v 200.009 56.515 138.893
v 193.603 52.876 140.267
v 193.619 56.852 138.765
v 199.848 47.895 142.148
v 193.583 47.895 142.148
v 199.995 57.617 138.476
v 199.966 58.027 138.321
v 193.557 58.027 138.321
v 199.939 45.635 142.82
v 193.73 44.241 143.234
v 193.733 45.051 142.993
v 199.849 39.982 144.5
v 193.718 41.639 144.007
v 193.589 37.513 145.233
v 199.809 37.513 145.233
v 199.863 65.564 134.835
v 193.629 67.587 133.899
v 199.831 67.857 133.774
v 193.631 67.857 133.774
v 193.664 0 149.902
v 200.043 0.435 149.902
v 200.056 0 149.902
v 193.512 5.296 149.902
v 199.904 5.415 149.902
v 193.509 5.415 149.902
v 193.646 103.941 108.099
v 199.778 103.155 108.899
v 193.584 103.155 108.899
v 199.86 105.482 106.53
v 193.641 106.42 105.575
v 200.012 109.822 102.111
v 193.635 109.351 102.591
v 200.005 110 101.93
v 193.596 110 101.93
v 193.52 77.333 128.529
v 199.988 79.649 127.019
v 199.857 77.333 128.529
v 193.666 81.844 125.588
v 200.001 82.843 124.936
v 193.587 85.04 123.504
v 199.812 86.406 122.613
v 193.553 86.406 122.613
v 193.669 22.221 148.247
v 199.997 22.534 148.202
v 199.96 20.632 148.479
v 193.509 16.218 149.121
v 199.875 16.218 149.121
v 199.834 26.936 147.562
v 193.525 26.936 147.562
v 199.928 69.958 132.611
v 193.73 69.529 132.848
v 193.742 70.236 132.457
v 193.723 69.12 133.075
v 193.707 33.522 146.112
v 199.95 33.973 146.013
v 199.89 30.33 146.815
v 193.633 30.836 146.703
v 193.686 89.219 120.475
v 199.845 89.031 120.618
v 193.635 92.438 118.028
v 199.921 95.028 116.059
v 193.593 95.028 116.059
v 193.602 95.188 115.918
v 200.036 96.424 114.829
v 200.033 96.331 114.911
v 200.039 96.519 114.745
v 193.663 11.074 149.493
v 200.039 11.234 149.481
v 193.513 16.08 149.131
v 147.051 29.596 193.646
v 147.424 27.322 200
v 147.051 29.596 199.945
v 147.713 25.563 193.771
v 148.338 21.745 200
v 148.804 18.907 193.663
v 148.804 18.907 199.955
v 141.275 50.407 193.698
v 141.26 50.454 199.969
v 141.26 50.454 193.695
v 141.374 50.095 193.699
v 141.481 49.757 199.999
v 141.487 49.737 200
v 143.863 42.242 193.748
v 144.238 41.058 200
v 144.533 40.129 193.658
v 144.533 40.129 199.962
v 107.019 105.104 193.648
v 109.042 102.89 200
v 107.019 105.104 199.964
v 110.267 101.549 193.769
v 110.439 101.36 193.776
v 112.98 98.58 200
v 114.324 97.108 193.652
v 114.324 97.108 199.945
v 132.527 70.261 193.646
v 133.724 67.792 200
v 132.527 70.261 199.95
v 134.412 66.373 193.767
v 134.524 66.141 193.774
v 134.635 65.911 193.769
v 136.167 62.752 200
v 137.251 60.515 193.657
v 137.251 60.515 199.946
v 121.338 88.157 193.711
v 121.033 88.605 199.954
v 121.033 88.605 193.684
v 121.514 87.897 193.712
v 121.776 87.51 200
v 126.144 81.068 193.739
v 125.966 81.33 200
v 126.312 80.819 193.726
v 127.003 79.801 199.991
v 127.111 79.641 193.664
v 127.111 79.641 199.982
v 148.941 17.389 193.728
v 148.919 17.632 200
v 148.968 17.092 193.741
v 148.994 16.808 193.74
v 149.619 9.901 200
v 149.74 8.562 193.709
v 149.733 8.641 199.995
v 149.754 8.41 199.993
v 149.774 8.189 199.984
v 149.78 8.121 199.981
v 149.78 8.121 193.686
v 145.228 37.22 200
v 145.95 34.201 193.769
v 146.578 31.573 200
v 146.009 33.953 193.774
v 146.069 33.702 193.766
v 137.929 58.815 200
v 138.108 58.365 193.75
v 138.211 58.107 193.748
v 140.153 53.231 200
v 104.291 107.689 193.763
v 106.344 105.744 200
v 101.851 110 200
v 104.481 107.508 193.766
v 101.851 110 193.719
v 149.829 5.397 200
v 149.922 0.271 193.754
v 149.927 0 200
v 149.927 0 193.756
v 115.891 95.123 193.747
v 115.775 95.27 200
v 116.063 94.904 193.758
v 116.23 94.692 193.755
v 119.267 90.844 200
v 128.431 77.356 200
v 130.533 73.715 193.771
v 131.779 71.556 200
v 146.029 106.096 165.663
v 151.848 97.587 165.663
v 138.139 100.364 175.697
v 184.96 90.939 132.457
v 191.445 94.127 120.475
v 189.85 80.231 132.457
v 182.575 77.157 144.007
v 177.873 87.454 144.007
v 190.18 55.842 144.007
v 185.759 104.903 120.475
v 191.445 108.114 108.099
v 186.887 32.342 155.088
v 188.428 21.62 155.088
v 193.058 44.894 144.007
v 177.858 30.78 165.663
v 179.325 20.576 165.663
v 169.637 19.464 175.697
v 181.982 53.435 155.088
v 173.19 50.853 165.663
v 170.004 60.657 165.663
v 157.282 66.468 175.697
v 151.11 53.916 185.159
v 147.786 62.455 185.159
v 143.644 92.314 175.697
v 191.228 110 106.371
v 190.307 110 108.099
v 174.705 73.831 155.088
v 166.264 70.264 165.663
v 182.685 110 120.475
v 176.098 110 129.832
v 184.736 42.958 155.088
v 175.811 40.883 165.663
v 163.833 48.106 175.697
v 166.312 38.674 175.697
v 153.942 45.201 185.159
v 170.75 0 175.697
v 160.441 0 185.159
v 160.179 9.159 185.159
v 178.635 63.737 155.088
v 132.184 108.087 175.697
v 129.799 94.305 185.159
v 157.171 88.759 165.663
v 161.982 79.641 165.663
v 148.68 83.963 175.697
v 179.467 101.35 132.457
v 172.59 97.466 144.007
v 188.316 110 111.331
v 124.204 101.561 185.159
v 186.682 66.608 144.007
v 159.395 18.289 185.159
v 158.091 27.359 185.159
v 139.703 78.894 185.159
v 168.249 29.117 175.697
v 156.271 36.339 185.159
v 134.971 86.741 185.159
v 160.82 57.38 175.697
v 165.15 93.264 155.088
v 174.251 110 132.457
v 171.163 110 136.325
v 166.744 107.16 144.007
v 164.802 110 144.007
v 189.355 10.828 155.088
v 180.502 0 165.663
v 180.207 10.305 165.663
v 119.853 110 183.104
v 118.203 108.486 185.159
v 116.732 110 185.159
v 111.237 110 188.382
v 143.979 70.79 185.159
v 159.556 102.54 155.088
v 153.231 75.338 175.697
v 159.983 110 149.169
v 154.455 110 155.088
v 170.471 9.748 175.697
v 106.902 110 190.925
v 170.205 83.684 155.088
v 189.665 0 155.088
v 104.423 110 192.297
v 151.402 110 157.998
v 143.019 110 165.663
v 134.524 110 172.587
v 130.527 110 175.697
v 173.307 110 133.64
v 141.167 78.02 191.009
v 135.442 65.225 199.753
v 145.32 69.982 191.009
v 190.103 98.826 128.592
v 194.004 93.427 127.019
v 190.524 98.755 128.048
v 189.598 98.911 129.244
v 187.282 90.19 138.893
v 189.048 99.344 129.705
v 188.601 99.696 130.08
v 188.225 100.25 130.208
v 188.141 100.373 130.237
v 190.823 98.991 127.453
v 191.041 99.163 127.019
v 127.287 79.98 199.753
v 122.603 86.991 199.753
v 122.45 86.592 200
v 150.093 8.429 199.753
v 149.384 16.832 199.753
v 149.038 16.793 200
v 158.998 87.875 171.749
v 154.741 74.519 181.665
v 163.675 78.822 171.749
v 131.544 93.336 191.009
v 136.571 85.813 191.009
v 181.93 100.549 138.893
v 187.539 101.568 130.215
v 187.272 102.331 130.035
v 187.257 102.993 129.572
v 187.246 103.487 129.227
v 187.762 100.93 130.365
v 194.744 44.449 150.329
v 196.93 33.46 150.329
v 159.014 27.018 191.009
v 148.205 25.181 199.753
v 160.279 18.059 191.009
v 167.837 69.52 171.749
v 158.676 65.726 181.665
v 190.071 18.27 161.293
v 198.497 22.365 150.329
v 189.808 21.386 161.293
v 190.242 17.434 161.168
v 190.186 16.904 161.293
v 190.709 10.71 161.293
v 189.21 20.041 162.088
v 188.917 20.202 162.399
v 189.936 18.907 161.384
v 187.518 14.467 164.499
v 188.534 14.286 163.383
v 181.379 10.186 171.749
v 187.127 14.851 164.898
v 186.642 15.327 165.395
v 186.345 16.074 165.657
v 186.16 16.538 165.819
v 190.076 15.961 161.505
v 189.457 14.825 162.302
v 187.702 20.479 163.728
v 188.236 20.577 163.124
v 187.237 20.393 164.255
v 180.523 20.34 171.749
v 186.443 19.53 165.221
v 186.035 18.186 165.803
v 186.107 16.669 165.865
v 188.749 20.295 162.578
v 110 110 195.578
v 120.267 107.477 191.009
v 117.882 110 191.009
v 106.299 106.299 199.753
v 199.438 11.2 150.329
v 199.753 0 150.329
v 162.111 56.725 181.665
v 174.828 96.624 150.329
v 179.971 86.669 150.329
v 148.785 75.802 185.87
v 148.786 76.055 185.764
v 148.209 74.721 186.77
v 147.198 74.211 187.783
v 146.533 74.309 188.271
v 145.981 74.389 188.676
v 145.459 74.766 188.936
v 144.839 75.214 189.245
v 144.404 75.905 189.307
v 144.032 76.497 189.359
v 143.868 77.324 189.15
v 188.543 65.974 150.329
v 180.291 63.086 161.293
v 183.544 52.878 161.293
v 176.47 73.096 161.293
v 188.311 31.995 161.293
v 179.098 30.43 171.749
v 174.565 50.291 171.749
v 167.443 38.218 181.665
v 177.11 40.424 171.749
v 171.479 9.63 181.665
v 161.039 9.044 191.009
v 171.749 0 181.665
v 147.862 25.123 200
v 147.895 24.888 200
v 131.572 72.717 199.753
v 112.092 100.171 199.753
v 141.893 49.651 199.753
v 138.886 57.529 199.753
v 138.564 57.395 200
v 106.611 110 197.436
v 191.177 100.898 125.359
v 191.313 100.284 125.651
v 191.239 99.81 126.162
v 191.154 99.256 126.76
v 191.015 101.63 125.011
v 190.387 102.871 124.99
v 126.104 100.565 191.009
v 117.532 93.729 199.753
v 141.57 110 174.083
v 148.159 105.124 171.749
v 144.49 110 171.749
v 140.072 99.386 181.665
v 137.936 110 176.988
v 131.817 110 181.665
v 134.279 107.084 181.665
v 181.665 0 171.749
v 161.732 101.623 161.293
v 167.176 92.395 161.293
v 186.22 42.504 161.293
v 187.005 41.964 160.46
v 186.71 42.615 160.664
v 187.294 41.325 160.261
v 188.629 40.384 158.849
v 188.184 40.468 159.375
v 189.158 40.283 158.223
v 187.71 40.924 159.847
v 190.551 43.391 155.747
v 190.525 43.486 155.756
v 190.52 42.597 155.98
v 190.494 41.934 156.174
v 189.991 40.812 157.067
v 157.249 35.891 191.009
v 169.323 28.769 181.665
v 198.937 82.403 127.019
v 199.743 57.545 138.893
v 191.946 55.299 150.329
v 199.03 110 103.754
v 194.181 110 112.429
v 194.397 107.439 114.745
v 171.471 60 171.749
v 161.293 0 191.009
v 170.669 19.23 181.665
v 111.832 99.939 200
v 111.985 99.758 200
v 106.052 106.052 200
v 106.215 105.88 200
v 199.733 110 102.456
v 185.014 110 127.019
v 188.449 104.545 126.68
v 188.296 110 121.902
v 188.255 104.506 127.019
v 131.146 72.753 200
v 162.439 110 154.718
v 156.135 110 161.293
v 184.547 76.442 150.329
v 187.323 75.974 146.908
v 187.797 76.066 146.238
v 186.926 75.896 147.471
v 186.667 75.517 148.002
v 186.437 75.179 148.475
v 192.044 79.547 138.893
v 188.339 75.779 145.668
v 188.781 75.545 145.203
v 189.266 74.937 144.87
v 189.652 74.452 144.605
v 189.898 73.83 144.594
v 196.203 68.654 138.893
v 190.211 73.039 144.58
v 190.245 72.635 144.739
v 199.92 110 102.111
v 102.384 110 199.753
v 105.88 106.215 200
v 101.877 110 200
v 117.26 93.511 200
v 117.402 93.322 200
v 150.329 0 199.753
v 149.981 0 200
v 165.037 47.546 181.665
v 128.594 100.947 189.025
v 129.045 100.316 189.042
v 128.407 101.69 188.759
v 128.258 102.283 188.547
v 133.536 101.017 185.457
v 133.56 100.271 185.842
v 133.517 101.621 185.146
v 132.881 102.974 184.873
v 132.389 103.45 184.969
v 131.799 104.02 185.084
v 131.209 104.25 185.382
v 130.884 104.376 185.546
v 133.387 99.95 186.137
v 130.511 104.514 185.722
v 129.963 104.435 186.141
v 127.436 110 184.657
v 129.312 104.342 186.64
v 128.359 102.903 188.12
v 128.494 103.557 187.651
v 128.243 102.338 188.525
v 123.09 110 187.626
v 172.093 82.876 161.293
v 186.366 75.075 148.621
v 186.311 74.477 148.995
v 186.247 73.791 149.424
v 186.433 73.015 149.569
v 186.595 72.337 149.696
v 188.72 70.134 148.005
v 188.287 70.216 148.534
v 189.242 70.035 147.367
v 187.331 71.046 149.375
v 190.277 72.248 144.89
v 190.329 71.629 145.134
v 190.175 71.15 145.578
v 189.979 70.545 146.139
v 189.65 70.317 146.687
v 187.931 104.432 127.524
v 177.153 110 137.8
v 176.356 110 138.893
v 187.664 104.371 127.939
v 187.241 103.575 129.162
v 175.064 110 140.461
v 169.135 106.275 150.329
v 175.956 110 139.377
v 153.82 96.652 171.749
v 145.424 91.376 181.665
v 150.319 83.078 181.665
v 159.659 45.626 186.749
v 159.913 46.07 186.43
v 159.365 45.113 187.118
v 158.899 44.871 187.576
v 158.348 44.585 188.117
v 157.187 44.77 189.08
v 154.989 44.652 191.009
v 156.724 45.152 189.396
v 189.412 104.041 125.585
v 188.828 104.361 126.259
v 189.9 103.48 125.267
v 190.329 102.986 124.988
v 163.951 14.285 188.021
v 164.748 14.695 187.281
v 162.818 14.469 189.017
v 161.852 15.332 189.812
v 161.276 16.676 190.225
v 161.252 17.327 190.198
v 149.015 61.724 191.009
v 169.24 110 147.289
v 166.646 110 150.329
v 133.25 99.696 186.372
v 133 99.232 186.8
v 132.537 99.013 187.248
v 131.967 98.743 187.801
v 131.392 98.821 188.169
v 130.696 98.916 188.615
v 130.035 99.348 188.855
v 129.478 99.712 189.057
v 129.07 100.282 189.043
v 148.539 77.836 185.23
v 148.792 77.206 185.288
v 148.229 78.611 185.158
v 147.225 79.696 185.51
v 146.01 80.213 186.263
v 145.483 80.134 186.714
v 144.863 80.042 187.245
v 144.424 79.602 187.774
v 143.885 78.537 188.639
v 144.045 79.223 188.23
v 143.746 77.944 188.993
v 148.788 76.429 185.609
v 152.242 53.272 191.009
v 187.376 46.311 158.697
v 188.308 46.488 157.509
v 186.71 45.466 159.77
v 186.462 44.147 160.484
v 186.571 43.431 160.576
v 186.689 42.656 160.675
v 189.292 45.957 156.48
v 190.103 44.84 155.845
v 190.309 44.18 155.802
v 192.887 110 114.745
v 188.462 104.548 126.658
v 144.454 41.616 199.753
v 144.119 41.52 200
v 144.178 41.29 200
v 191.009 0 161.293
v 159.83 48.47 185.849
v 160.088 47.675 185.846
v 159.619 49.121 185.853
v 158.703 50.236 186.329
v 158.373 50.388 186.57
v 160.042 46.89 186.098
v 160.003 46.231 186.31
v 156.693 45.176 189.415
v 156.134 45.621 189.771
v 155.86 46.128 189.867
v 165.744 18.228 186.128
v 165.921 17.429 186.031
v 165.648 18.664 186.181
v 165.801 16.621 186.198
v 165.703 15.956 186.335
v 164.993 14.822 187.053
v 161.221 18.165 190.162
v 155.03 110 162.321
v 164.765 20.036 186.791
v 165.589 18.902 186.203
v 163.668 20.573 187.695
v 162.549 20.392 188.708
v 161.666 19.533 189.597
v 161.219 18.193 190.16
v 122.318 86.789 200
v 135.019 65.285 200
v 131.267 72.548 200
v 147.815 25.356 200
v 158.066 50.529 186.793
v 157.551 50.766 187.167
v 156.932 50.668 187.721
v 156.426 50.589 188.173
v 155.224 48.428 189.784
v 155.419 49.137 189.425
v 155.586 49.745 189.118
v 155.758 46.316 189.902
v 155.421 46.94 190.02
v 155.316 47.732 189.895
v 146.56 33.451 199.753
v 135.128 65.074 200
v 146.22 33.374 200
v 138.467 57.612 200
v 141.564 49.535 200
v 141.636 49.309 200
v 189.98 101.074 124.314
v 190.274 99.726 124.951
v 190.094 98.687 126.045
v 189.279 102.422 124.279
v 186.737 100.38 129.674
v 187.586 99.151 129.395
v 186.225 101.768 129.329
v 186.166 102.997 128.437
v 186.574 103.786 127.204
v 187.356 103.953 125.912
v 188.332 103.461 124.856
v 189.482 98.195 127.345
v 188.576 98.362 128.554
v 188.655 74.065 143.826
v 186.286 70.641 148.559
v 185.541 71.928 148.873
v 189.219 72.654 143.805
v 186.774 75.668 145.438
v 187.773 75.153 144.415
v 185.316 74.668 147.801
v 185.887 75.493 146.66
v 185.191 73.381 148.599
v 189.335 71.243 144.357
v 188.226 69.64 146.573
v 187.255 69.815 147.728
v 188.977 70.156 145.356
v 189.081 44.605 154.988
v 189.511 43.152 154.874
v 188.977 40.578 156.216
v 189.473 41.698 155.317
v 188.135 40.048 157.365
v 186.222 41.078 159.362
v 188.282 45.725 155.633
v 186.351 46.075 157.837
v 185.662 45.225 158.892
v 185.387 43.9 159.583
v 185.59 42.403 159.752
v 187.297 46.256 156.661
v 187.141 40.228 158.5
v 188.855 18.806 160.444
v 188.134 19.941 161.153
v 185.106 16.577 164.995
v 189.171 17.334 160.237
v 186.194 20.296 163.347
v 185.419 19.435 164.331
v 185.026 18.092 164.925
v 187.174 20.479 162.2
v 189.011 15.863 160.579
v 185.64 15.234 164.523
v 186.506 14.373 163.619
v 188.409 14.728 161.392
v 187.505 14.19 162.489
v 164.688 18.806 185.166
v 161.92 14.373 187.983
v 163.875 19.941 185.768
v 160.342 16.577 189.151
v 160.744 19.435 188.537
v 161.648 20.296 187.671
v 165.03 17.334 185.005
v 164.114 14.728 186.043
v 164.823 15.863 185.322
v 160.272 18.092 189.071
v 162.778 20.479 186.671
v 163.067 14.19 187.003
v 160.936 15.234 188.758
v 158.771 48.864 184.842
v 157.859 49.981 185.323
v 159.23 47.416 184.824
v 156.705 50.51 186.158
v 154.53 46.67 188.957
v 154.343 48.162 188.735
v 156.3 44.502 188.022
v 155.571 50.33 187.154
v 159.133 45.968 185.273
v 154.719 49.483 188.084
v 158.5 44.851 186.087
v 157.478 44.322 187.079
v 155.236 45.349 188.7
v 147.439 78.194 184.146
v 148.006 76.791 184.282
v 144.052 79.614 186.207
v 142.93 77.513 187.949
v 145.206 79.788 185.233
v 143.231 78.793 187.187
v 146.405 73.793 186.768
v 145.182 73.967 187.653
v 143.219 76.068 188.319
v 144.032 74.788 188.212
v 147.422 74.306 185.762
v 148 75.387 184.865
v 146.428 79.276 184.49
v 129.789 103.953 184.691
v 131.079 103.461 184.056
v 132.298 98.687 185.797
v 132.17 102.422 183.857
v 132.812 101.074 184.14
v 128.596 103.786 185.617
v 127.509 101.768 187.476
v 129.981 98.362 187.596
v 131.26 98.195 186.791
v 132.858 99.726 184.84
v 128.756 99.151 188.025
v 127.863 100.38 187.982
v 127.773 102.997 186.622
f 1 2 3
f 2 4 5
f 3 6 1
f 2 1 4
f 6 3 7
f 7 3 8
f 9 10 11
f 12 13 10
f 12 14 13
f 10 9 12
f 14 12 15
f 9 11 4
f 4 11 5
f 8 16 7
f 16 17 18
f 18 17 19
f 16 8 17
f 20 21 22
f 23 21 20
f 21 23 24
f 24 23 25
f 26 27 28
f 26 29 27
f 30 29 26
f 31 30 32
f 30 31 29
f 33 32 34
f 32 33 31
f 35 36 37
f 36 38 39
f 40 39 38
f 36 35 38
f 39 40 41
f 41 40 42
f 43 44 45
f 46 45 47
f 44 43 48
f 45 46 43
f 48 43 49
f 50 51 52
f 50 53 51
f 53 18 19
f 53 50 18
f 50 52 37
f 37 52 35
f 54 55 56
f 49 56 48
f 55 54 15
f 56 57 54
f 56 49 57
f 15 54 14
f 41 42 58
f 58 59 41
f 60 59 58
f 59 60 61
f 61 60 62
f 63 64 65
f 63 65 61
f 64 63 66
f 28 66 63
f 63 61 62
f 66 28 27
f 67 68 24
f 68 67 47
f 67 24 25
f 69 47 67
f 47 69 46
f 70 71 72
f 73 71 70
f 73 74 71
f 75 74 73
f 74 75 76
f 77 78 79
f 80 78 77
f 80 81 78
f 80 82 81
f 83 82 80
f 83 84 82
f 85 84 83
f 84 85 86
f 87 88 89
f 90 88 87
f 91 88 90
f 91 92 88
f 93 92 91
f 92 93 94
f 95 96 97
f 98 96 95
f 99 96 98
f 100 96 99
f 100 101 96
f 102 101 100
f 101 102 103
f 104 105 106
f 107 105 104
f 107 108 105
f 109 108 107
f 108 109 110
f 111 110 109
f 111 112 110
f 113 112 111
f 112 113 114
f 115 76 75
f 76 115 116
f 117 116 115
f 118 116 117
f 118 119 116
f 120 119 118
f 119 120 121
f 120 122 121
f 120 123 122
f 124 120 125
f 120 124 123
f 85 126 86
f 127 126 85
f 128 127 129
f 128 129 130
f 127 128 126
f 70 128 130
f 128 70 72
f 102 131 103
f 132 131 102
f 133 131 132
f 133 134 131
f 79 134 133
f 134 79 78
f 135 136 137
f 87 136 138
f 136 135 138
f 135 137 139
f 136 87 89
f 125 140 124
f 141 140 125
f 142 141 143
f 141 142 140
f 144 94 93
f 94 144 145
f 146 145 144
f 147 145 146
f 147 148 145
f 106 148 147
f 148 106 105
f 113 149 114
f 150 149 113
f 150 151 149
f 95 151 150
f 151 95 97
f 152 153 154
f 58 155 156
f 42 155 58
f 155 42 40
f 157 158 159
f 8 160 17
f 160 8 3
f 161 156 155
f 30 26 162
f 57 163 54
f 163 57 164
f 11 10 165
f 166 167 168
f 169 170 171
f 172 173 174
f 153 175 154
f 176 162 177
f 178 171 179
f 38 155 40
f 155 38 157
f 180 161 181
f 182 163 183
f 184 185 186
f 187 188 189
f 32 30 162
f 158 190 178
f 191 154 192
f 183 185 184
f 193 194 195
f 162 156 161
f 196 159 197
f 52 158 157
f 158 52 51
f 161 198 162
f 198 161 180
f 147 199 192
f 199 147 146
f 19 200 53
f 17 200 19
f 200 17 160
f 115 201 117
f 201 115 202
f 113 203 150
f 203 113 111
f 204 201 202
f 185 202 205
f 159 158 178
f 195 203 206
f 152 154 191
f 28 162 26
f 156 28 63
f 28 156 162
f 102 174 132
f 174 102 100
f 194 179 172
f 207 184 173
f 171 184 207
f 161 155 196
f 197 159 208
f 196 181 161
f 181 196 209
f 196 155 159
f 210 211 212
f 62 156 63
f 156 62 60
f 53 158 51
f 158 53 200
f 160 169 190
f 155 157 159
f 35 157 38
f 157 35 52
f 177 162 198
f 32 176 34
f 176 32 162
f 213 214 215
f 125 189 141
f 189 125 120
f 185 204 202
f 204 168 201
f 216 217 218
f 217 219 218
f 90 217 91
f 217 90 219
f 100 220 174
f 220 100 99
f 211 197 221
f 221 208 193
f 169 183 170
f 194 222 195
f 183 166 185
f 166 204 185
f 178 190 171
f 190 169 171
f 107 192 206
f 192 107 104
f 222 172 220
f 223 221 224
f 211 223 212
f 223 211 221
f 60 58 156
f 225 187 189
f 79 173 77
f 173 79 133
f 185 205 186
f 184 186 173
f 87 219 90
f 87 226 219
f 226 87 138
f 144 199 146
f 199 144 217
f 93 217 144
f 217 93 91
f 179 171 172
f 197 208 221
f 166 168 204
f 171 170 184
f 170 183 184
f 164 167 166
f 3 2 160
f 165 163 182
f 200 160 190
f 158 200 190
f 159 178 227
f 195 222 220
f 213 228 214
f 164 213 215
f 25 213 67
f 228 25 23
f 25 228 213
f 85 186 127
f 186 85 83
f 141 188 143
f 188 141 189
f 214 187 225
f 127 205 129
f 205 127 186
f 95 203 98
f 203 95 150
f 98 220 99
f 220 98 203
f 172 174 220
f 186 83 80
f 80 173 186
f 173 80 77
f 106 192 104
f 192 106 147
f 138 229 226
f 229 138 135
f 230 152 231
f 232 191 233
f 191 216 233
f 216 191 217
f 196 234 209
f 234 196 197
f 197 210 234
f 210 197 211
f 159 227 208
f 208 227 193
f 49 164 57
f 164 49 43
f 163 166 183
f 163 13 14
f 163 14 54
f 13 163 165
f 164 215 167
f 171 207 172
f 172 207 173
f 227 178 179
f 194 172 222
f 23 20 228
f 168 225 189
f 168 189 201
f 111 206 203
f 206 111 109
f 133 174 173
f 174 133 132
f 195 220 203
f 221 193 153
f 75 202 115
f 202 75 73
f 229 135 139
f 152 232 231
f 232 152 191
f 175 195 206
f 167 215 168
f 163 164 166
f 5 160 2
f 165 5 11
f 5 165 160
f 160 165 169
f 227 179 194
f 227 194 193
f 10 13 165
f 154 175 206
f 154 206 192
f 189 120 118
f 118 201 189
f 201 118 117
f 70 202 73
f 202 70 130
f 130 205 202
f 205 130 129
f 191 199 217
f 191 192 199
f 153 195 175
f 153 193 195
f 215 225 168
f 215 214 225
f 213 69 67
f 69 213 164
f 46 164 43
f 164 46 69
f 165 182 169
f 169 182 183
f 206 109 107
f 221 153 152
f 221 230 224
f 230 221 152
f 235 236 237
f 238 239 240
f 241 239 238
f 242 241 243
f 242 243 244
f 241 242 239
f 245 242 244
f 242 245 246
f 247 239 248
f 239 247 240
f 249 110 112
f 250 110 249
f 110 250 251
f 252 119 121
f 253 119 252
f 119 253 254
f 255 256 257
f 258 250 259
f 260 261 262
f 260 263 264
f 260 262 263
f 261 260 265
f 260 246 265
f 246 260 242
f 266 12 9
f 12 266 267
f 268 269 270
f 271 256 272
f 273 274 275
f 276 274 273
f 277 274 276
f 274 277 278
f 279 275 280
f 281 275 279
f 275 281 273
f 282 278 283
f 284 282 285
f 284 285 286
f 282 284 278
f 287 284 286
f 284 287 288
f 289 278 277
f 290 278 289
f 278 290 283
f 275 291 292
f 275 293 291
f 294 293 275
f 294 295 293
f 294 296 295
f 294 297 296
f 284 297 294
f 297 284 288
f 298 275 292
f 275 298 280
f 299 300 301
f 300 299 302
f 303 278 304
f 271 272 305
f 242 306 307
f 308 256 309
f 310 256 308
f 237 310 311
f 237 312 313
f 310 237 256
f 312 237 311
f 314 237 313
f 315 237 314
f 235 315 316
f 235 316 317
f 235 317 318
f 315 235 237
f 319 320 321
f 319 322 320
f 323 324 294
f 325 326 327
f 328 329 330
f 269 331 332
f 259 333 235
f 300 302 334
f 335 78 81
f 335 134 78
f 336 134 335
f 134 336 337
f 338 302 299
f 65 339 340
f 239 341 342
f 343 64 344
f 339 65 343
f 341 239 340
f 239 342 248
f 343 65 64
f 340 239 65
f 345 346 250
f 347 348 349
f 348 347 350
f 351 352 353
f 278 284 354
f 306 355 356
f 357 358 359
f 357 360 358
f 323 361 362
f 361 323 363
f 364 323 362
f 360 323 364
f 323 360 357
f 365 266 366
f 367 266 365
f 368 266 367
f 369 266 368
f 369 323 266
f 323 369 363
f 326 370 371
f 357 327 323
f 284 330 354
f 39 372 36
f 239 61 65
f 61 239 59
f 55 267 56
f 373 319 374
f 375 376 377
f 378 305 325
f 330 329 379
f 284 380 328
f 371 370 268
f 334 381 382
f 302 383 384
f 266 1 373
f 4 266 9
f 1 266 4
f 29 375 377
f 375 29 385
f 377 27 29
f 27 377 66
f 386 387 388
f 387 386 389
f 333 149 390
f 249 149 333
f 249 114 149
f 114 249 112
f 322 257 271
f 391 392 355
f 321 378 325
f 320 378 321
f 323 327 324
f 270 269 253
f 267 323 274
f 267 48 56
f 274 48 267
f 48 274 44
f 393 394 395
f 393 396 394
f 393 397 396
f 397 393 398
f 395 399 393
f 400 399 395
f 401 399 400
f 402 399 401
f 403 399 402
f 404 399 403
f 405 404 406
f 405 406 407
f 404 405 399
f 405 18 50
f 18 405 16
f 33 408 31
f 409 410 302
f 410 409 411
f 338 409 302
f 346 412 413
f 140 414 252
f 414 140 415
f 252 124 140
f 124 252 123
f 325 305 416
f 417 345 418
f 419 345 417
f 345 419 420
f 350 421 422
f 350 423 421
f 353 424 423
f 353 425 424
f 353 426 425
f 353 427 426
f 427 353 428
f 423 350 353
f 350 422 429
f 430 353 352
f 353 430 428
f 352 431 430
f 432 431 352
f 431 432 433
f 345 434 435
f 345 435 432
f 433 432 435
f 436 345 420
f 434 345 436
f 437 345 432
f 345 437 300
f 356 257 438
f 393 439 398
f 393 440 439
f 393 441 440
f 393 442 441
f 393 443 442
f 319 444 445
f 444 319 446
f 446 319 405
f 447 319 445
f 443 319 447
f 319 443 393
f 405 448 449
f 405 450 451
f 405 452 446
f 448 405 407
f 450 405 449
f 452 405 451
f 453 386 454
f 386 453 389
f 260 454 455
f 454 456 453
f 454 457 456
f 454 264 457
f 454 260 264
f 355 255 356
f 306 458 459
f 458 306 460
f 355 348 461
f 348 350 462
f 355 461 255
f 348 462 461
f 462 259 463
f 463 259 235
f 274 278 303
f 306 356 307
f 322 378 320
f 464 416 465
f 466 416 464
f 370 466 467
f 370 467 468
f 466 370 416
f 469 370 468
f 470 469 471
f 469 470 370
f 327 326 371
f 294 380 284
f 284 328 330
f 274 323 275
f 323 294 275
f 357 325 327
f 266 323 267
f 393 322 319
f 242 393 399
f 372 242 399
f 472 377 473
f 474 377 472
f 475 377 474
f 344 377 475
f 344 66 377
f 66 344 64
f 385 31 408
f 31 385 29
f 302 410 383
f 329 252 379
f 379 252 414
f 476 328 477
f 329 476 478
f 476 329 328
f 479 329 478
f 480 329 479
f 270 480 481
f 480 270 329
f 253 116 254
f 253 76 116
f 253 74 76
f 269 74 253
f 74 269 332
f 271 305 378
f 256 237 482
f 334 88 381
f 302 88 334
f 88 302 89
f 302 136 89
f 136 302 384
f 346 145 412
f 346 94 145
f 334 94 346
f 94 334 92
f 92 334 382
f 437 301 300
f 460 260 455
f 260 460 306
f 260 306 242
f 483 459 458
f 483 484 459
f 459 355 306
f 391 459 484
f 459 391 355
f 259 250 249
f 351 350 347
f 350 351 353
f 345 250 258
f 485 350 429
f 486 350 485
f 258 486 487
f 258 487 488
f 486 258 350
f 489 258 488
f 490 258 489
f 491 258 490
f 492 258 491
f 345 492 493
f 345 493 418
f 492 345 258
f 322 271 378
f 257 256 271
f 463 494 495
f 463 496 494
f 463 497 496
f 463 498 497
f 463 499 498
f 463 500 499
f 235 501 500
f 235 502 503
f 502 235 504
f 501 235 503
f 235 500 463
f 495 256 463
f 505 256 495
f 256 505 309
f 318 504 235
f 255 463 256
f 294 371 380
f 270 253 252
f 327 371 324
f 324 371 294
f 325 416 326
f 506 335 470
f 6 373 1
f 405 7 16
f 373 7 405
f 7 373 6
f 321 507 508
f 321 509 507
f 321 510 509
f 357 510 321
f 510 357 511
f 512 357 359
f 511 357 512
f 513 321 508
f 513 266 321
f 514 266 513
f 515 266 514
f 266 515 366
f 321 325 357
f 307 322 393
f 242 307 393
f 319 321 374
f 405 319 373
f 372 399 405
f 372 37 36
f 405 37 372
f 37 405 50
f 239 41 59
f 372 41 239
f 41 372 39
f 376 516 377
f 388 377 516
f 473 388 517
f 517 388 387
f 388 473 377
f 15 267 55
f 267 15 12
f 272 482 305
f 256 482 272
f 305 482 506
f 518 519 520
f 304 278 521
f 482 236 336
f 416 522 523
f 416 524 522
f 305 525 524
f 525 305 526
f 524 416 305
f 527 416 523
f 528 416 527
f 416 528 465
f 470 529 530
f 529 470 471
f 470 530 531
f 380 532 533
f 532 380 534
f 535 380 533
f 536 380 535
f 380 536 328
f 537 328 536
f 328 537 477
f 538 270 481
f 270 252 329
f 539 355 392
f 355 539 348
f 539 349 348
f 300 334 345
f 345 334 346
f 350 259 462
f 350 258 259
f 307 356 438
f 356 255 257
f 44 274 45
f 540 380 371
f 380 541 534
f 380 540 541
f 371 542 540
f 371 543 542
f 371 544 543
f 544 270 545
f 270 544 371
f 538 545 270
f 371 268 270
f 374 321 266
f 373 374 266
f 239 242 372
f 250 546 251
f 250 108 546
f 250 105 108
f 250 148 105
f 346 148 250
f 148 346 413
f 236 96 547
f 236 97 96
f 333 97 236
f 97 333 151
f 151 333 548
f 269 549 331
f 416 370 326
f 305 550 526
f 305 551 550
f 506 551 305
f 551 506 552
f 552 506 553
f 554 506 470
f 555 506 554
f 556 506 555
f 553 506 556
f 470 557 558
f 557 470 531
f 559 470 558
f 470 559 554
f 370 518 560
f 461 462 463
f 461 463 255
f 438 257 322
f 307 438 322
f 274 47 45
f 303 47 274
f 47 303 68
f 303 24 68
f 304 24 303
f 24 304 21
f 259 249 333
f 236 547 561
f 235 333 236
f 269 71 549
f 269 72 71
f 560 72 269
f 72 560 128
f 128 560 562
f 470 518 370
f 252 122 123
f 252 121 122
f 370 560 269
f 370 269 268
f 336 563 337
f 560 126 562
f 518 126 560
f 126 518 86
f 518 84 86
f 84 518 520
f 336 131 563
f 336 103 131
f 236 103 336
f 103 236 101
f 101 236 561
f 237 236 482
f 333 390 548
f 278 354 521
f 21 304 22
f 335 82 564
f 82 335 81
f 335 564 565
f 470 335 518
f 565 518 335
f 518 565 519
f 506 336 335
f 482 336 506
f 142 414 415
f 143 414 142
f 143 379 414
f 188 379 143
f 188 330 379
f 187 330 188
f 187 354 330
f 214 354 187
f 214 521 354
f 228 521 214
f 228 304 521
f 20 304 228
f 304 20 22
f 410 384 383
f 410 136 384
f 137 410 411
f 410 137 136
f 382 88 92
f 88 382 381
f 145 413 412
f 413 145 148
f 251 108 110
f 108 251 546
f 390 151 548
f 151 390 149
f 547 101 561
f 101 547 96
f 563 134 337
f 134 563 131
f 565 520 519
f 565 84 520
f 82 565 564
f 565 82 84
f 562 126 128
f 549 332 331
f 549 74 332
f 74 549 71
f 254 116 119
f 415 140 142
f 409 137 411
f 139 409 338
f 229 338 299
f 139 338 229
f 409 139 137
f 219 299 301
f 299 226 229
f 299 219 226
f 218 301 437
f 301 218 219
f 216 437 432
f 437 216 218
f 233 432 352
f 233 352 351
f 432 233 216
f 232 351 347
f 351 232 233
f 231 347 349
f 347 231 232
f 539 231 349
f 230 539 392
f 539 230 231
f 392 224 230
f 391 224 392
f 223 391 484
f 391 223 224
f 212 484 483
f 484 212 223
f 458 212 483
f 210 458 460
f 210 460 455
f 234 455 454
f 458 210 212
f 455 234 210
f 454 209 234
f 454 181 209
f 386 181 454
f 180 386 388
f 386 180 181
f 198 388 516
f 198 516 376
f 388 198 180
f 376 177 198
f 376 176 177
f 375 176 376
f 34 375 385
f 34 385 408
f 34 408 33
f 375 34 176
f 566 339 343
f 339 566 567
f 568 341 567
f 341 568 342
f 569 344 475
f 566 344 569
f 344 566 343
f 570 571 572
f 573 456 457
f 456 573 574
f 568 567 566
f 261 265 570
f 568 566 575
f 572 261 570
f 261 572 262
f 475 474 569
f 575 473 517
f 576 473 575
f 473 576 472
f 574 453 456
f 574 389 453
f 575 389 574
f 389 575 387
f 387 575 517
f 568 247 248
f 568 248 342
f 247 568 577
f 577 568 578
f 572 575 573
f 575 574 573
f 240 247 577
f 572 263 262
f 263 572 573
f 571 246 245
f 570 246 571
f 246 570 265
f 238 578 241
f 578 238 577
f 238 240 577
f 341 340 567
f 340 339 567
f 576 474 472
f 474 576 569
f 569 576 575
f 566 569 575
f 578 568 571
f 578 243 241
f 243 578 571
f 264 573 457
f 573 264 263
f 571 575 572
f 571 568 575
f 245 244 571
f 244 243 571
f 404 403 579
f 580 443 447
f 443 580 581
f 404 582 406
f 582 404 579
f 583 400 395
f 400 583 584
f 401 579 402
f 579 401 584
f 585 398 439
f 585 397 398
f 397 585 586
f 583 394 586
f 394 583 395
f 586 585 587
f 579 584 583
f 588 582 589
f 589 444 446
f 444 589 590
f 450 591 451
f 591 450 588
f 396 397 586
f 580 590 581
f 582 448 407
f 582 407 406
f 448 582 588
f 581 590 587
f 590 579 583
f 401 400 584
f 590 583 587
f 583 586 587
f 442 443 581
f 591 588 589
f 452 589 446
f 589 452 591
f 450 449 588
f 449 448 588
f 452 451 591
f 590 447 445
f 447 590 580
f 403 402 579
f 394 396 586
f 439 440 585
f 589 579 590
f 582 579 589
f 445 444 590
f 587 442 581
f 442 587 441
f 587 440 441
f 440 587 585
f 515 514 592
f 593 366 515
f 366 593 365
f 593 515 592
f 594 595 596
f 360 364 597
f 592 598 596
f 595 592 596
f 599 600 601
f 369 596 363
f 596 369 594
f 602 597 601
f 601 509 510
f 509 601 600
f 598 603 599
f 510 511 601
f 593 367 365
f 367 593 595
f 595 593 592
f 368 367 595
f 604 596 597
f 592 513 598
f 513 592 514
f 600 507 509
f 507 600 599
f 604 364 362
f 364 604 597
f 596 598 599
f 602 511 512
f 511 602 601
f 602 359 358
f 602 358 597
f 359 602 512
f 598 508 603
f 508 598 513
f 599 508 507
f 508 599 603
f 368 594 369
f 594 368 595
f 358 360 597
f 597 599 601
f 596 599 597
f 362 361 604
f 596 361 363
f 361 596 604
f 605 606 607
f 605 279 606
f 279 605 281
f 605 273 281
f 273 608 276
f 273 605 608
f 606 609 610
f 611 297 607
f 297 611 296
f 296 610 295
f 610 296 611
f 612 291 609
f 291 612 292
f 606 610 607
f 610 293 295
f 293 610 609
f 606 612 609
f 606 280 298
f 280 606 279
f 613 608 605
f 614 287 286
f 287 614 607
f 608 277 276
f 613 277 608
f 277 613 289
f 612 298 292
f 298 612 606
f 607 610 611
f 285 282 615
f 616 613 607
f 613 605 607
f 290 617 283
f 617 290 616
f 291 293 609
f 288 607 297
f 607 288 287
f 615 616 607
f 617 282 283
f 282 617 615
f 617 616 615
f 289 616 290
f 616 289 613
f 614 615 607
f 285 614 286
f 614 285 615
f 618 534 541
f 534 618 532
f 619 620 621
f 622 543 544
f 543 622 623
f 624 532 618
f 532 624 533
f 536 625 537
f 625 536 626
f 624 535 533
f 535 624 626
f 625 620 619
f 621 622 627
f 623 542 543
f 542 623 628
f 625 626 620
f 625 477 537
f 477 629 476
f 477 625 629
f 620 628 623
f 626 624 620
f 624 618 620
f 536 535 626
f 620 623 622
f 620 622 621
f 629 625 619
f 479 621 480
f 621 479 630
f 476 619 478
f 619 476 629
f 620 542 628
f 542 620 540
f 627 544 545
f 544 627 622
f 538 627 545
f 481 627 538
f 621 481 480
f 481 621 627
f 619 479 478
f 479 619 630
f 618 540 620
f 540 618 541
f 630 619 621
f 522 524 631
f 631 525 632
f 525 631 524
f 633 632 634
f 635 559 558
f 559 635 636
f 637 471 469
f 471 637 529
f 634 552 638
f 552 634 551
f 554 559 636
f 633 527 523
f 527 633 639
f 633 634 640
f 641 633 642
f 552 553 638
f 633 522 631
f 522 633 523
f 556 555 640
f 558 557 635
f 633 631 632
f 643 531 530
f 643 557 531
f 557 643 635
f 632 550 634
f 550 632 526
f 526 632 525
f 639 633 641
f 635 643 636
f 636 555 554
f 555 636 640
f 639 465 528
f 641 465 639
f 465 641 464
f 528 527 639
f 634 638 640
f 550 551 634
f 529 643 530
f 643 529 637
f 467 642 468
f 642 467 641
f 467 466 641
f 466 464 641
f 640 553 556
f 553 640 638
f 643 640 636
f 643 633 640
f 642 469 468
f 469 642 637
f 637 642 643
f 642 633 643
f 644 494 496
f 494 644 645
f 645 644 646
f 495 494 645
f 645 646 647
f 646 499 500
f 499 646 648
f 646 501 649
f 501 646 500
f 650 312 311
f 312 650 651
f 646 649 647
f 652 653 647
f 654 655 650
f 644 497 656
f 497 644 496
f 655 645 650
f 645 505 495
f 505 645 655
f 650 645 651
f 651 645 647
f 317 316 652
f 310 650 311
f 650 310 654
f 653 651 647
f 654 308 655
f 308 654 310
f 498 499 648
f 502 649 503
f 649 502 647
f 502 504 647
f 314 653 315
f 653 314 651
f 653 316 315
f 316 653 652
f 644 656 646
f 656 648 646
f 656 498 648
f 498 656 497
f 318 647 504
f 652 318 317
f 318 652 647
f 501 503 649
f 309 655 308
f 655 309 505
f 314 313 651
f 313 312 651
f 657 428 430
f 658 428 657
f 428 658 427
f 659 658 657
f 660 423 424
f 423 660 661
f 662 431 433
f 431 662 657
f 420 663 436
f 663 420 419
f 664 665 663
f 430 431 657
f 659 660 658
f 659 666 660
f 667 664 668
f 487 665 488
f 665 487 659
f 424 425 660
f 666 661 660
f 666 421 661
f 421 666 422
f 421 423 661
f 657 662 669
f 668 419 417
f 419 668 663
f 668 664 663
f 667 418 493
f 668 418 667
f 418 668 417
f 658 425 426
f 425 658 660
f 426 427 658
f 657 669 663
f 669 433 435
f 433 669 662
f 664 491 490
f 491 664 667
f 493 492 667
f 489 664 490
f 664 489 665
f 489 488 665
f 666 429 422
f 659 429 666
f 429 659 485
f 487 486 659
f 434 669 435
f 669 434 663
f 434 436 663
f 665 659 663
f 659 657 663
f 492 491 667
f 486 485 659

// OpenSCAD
// file: ../motors/MN5212.scad
use <../utils.scad>

module MN5212(){

	render(){
		translate([0,0, 42.5 / 2 - 23 / 2 - 4.9 - 6])
			cylinder(
				h = 23,
				r = 59 / 2,
				$fa = fa(59 / 2),
				center = true);
		translate([0,0, 42.5 / 2 - 4.9 / 2 - 6])
			cylinder(
				h = 4.9,
				r1 = 59 / 2,
				r2 = 24.8 / 2,
				$fa = fa(59 / 2),
				center = true);
		translate([0,0, - 42.5 / 2 + 5.6 / 2 + 3])
			cylinder(
				h = 5.6,
				r1 = 44 / 2,
				r2 = 59 / 2,
				$fa = fa(59 / 2),
				center = true);
		translate([0, 0, 42.5 / 2 - 3])
			cylinder(
				h = 6,
				r = 4 / 2,
				$fa = fa(4 / 2),
				center = true);
		translate([0, 0, - 42.5 / 2 + 1.5])
			cylinder(
				h = 3,
				r = 6 / 2,
				$fa = fa(6 / 2),
				center = true);
	}

}
// file: ../servos/HS_5065MG.scad
use <../utils.scad>

module HS_5065MG(){

	length = 23.75;
	width = 11.68;
	depth = 20.32;
	wing_width = 32.38;
	wing_thick = 3.43;
	shaft_offset = 6;
	hole_spacing = 28.32;
	shaft_height = 26.16;
	shaft_length = 2;

	module mounting_hole(){
		mh_rad = 2 / 2;
		translate(
			[
				hole_spacing / 2,
				0,
				depth / 2 - wing_thick / 2
			])
			cylinder(h = 5, r = mh_rad, $fa = fa(mh_rad), center = true);
	}

	difference(){
		union(){
			cube([length, width, depth], center = true);
			translate([0, 0, depth / 2 - wing_thick / 2])
				cube([wing_width, width, wing_thick], center = true);
			translate(
				[
					- length / 2 + shaft_offset,
					0,
					shaft_height - length / 2 + shaft_length / 2
				])
				cylinder(
					h = shaft_length,
					r = 1.5,
					$fa = fa(1.5),
					center = true);
		}	union(){

			mounting_hole();
			mirror() mounting_hole();
		}
	}
}

HS_5065MG();
// file: ../servos/LS_0006_servo.scad
// Author Michael Marques (DrYerzinia)

use <../utils.scad>

module ls_0006_servo(){
	
	length = 21.4;
	depth = 19.9;
	thickness = 11.65;

	gear_height = 2.6;
	gear_bump_height = 0.7;
	gear_bump_diameter = 1.97;
	gear_outer_bump_diameter = 6;
	gear_bump_offset = 12.2;

	shaft_height = 2.4;
	shaft_diameter = 3.74;
	shaft_offset = thickness / 2;
	shaft_screw_diameter = 1.3;
	
	wing_outer_width = 8.5;
	wing_top_off = 3.8;
	wing_length = 3.8;
	wing_thickness = 1.2;
	wing_hole_diameter = 1.85;
	wing_hole_edge_dist = 2;

	module wing_hole(){
		translate(
			[
				length / 2 + wing_hole_edge_dist,
				0,
				depth/2 - wing_top_off - wing_thickness / 2
			])
			cylinder(
				h = wing_thickness + 1,
				r = wing_hole_diameter / 2,
				$fn = 16,
				center = true);
	}

	module wing(){
		translate(
			[
				length / 2,
				thickness / 2,
				depth/2 - wing_top_off - wing_thickness
			])
			rotate([0,0,-90])
				trapezoid(
					thickness,
					wing_outer_width,
					wing_length,
					wing_thickness);
	}

	// Body
	cube([length, thickness, depth], center = true);

	difference(){
		union(){

			wing();
			mirror() wing();

			// Gear Bumps
			translate([0, 0, depth/2 + gear_height / 2]){
				translate([length / 2 - gear_bump_offset, 0, 0])
					cylinder(
						h = gear_height,
						r = gear_outer_bump_diameter / 2,
						$fn = 16,
						center = true);
				translate([length / 2 - gear_bump_offset, 0, gear_height/2 + gear_bump_height / 2])
					cylinder(
						h = gear_bump_height,
						r = gear_bump_diameter / 2,
						$fn = 16,
						center = true);
				translate([length / 2 - shaft_offset, 0, 0])
					cylinder(
						h = gear_height,
						r = thickness / 2,
						$fn = 32,
						center = true);
				// Shaft
				translate([length / 2 - shaft_offset, 0, gear_height])
					cylinder(
						h = shaft_height,
						r = shaft_diameter / 2,
						$fn = 16,
						center = true);
			}

		}
		union(){

			wing_hole();
			mirror() wing_hole();

			// Shaft_hole
			translate(
				[
					length / 2 - shaft_offset,
					0,
					depth/2 + gear_height * (3 / 2) + 0.5])
				cylinder(
					h = shaft_height + 1,
					r = shaft_screw_diameter / 2,
					$fn = 16,
					center = true);

		}
	}

}

module translate_ls_0006_attachment(){

	length = 21.4;
	thickness = 11.65;
	shaft_offset = thickness / 2;
	depth = 19.9;
	float = 3.3;

	translate([length / 2 - shaft_offset, 0, depth / 2 + float])
		children();

}

module bar_attachment(){

	height = 3.75;
	bar_length = 14.7;
	bar_thickness = 1.6;
	inner_radius = 5.9;
	outer_radius = 3.95;
	shaft_diameter = 3.7;
	upper_void_diameter = 4.8;
	screw_diameter = 2;
	hole_spacing = 2;
	hole_4_diameter = 1.2;
	hole_diameter = 1;
	hole_start_off = 4.7;
	top_void_depth = 0.67;
	bottom_void_depth = 1.84;

	translate([0, 0, height / 2]){
		difference(){
			union(){

				translate([0, inner_radius / 2, height / 2 - bar_thickness])
					rotate([0,0,-90])
						trapezoid(
							inner_radius,
							outer_radius,
							bar_length,
							bar_thickness);

				cylinder(
					h = height,
					r = inner_radius / 2,
					$fn = 16,
					center = true);

				translate([bar_length, 0, height / 2 - bar_thickness / 2])
					cylinder(
						h = bar_thickness,
						r = outer_radius / 2,
						$fn = 16,
						center = true);

			}
			union(){
				// screwhole
				cylinder(
					h = height + 1,
					r = screw_diameter / 2,
					$fn = 16,
					center = true);
				// voids
				translate([0, 0, height / 2 - top_void_depth / 2 + 0.5])
					cylinder(
						h = top_void_depth + 1,
						r = upper_void_diameter / 2,
						$fn = 16,
						center = true);
				translate([0, 0,  - bottom_void_depth / 2 - 0.5])
					cylinder(
						h = bottom_void_depth + 1,
						r = shaft_diameter / 2,
						$fn = 16,
						center = true);

				for(i = [0:4]){
					dia = (i != 3) ? hole_diameter : hole_4_diameter;
					translate(
						[
							hole_start_off + hole_spacing * i,
							0,
							height / 2 - bar_thickness / 2])
						cylinder(
							h = bar_thickness + 1,
							r = dia / 2,
							$fn = 16,
							center = true);
				}

			}
		}
	}

}

ls_0006_servo();
translate_ls_0006_attachment() bar_attachment();
// file: ../servos/parallax_continuous_rotation_servo.scad
// Author Michael Marques (DrYerzinia)

module parallax_continuous_rotation_servo(){

	depth = 37.7;
	length = 40.75;
	width = 19.75;

	mount_height = 2.7;
	mount_extent = 6.1;
	mount_from_top = 7.7;

	mount_hole_diameter = 4.46;
	mount_hole_spacing = 14.4 - mount_hole_diameter;

	shaft_diameter = 5.8;
	shaft_offset = 10;
	shaft_length = 3.5;

	module mounting_hole(){

			translate(
				[
					length / 2 + 5,
					mount_hole_spacing / 2,
					depth / 2 - mount_height / 2 - mount_from_top
				]
				)
				cylinder(
					h = mount_height + 1,
					r = mount_hole_diameter / 2,
					$fn=16,
					center = true);
	}

	difference(){
		union(){

			// Body
			cube([length,width,depth], center = true);

			// Mounting wings
			translate(
				[
					0,
					0,
					depth / 2 - mount_height / 2 - mount_from_top
				])
				cube(
					[
						length + mount_extent * 2,
						width,
						mount_height
					],
					center = true);

			// Shaft
			translate(
				[
					length / 2 - shaft_offset,
					0,
					depth / 2 + shaft_length / 2
				]
				)
				cylinder(
					h = shaft_length,
					r = shaft_diameter / 2,
					$fn = 16,
					center = true
				);

		}
		union(){

			// Mounting Holes
			mounting_hole();
			mirror()
				mounting_hole();

			translate([0,-mount_hole_spacing,0]){
				mounting_hole();
				mirror()
					mounting_hole();
			}
		}
	}

}

module translate_shaft(){

	depth = 37.7;
	length = 40.75;

	shaft_offset = 10;

	translate(
		[
			length / 2 - shaft_offset,
			0,
			depth / 2
		])
		children();
}

module round_servo_attachment(){

	height = 6;
	diameter = 20.8;
	inner_diameter = 8.6;
	plate_thickness = 2.45;

	float = 2;

	depth = 37.7;
	length = 40.75;

	shaft_offset = 10;

	plate_hole_spacing = 14.5;
	plate_hole_diameter = 1.4;
	plate_hole_minor_spacing = 3.5;

	screw_hole_diameter = 3;

	inner_diameter = 8;
	
	top_depth = 1.8;
	bottom_depth = 3.4;

	void_diameter = 5.8;

	module plate_hole(){
		cylinder(
			h = plate_thickness + 1,
			r = plate_hole_diameter / 2,
			$fn = 16,
			center = true
		);
	}

	module plate_hole_group(){
		translate([0, 0, height / 2 - plate_thickness / 2]){
			translate([0, plate_hole_spacing / 2, 0]){
					plate_hole();
					translate([- plate_hole_minor_spacing, 0, 0])
						plate_hole();
					translate([  plate_hole_minor_spacing, 0, 0])
						plate_hole();
			}
		}
	}

	translate(
		[
			length / 2 - shaft_offset,
			0,
			depth / 2 + height / 2 + float
		]
		)
		difference(){

			union(){

				// inner shaft
				cylinder(
					h = height,
					r = inner_diameter / 2,
					$fn = 16,
					center = true
				);

				// top
				translate([0, 0, height / 2 - plate_thickness / 2])
					cylinder(
						h = plate_thickness,
						r = diameter / 2,
						$fn = 32,
						center = true
					);
			}

			union(){

				// plate holes
				for(ang = [0:3]){
					rotate([0,0, ang * 90])
						plate_hole_group();
				}

				// screw hole
				cylinder(
					h = height + 1,
					r = screw_hole_diameter / 2,
					$fn = 16,
					center = true
				);

				// inner voids
				translate([0, 0, height / 2 - top_depth / 2 + 1])
					cylinder(
						h = top_depth + 1,
						r = void_diameter / 2,
						$fn = 16,
						center = true
					);
				translate([0, 0, -1])
					cylinder(
						h = bottom_depth + 1,
						r = void_diameter / 2,
						$fn = 16,
						center = true
					);

			}

		}

}

parallax_continuous_rotation_servo();
round_servo_attachment();
// file: ../hardware.scad
 // Author Michael Marques (DrYerzinia)

// http://www.ebay.com/itm/10-PCS-683-3x7x2-mm-Metal-OPEN-PRECISION-Miniature-Ball-Bearing-3-7-2-/291206307942?hash=item43cd3fa066:m:mCi6eovrGVk_CjIUjlhw8yg
// E-Bay empire.rc

module washer_M3_7x3_2x0_5mm(){

	difference(){
		cylinder(
			h = 0.5,
			r = 7 / 2,
			$fn = 16,
			center = true);
		cylinder(
			h = 0.5 + 0.1,
			r = 3.2 / 2,
			$fn = 16,
			center = true);
	}

}

module bearing_3x7x2mm(){

	difference(){
		cylinder(
			h = 2,
			r = 7 / 2,
			$fn = 16,
			center = true);
		cylinder(
			h = 2 + 1,
			r = 3 / 2,
			$fn = 16,
			center = true);
	}

}

module bearing_5x8x2_5mm(){

	difference(){
		cylinder(
			h = 2.5,
			r = 8 / 2,
			$fn = 16,
			center = true);
		cylinder(
			h = 2.5 + 1,
			r = 5 / 2,
			$fn = 16,
			center = true);
	}

}

module bearing_8x16x5mm(){

	difference(){
		cylinder(
			h = 5,
			r = 16 / 2,
			$fn = 16,
			center = true);
		cylinder(
			h = 5 + 1,
			r = 8 / 2,
			$fn = 16,
			center = true);
	}

}


bearing_5x8x2_5mm();
// file: ../utils.scad
// http://forum.openscad.org/Creating-pie-pizza-slice-shape-need-a-dynamic-length-array-td3148.html

module pie_slice(r, start_angle, end_angle) {
    R = r * sqrt(2) + 1;
    a0 = (4 * start_angle + 0 * end_angle) / 4;
    a1 = (3 * start_angle + 1 * end_angle) / 4;
    a2 = (2 * start_angle + 2 * end_angle) / 4;
    a3 = (1 * start_angle + 3 * end_angle) / 4;
    a4 = (0 * start_angle + 4 * end_angle) / 4;
    if(end_angle > start_angle)
        intersection() {
        circle(r, $fa = fa(r));
        polygon([
            [0,0],
            [R * cos(a0), R * sin(a0)],
            [R * cos(a1), R * sin(a1)],
            [R * cos(a2), R * sin(a2)],
            [R * cos(a3), R * sin(a3)],
            [R * cos(a4), R * sin(a4)],
            [0,0]
       ]);
    }
}

// https://github.com/openscad/openscad/issues/29

module rotate_about(v,a) {
	translate(v) rotate(a) translate(-v) children(0);
}

module rotate_about_axis(v, ang, axis) {
	translate(v) rotate(ang, axis) translate(-v) children(0);
}

// https://github.com/robofun/openscad-utils/blob/master/trapezoid.scad

module trapezoid(width_base, width_top,height,thickness) {
	

  linear_extrude(height = thickness) polygon(points=[[0,0],[width_base,0],[width_base-(width_base-width_top)/2,height],[(width_base-width_top)/2,height]], paths=[[0,1,2,3]]); 
  
}

// http://forum.openscad.org/fe-Tolerance-based-arc-approximation-td14212.html

function fa(r)=($fn>0)?360/$fn:($fe>0)?($fe<r)?min(45,2*acos(1-$fe/r)):45:$fa; 
// file: ../render_settings.scad
// Author Michael Marques (DrYerzinia)

// Lulzbot Mini tolerances
// x/y 0.1mm
// z   0.05mm
//
// 0.1mm   preview tolerance
// 0.025mm export  tolerance

$fs = 0.01;
$fn = undef;
$fa = 360 / 5;

$fe = 0.025;	// export
// main file
// Author Michael Marques (DrYerzinia)

include <../render_settings.scad>

use <../BB8.scad>

Body_P9();
